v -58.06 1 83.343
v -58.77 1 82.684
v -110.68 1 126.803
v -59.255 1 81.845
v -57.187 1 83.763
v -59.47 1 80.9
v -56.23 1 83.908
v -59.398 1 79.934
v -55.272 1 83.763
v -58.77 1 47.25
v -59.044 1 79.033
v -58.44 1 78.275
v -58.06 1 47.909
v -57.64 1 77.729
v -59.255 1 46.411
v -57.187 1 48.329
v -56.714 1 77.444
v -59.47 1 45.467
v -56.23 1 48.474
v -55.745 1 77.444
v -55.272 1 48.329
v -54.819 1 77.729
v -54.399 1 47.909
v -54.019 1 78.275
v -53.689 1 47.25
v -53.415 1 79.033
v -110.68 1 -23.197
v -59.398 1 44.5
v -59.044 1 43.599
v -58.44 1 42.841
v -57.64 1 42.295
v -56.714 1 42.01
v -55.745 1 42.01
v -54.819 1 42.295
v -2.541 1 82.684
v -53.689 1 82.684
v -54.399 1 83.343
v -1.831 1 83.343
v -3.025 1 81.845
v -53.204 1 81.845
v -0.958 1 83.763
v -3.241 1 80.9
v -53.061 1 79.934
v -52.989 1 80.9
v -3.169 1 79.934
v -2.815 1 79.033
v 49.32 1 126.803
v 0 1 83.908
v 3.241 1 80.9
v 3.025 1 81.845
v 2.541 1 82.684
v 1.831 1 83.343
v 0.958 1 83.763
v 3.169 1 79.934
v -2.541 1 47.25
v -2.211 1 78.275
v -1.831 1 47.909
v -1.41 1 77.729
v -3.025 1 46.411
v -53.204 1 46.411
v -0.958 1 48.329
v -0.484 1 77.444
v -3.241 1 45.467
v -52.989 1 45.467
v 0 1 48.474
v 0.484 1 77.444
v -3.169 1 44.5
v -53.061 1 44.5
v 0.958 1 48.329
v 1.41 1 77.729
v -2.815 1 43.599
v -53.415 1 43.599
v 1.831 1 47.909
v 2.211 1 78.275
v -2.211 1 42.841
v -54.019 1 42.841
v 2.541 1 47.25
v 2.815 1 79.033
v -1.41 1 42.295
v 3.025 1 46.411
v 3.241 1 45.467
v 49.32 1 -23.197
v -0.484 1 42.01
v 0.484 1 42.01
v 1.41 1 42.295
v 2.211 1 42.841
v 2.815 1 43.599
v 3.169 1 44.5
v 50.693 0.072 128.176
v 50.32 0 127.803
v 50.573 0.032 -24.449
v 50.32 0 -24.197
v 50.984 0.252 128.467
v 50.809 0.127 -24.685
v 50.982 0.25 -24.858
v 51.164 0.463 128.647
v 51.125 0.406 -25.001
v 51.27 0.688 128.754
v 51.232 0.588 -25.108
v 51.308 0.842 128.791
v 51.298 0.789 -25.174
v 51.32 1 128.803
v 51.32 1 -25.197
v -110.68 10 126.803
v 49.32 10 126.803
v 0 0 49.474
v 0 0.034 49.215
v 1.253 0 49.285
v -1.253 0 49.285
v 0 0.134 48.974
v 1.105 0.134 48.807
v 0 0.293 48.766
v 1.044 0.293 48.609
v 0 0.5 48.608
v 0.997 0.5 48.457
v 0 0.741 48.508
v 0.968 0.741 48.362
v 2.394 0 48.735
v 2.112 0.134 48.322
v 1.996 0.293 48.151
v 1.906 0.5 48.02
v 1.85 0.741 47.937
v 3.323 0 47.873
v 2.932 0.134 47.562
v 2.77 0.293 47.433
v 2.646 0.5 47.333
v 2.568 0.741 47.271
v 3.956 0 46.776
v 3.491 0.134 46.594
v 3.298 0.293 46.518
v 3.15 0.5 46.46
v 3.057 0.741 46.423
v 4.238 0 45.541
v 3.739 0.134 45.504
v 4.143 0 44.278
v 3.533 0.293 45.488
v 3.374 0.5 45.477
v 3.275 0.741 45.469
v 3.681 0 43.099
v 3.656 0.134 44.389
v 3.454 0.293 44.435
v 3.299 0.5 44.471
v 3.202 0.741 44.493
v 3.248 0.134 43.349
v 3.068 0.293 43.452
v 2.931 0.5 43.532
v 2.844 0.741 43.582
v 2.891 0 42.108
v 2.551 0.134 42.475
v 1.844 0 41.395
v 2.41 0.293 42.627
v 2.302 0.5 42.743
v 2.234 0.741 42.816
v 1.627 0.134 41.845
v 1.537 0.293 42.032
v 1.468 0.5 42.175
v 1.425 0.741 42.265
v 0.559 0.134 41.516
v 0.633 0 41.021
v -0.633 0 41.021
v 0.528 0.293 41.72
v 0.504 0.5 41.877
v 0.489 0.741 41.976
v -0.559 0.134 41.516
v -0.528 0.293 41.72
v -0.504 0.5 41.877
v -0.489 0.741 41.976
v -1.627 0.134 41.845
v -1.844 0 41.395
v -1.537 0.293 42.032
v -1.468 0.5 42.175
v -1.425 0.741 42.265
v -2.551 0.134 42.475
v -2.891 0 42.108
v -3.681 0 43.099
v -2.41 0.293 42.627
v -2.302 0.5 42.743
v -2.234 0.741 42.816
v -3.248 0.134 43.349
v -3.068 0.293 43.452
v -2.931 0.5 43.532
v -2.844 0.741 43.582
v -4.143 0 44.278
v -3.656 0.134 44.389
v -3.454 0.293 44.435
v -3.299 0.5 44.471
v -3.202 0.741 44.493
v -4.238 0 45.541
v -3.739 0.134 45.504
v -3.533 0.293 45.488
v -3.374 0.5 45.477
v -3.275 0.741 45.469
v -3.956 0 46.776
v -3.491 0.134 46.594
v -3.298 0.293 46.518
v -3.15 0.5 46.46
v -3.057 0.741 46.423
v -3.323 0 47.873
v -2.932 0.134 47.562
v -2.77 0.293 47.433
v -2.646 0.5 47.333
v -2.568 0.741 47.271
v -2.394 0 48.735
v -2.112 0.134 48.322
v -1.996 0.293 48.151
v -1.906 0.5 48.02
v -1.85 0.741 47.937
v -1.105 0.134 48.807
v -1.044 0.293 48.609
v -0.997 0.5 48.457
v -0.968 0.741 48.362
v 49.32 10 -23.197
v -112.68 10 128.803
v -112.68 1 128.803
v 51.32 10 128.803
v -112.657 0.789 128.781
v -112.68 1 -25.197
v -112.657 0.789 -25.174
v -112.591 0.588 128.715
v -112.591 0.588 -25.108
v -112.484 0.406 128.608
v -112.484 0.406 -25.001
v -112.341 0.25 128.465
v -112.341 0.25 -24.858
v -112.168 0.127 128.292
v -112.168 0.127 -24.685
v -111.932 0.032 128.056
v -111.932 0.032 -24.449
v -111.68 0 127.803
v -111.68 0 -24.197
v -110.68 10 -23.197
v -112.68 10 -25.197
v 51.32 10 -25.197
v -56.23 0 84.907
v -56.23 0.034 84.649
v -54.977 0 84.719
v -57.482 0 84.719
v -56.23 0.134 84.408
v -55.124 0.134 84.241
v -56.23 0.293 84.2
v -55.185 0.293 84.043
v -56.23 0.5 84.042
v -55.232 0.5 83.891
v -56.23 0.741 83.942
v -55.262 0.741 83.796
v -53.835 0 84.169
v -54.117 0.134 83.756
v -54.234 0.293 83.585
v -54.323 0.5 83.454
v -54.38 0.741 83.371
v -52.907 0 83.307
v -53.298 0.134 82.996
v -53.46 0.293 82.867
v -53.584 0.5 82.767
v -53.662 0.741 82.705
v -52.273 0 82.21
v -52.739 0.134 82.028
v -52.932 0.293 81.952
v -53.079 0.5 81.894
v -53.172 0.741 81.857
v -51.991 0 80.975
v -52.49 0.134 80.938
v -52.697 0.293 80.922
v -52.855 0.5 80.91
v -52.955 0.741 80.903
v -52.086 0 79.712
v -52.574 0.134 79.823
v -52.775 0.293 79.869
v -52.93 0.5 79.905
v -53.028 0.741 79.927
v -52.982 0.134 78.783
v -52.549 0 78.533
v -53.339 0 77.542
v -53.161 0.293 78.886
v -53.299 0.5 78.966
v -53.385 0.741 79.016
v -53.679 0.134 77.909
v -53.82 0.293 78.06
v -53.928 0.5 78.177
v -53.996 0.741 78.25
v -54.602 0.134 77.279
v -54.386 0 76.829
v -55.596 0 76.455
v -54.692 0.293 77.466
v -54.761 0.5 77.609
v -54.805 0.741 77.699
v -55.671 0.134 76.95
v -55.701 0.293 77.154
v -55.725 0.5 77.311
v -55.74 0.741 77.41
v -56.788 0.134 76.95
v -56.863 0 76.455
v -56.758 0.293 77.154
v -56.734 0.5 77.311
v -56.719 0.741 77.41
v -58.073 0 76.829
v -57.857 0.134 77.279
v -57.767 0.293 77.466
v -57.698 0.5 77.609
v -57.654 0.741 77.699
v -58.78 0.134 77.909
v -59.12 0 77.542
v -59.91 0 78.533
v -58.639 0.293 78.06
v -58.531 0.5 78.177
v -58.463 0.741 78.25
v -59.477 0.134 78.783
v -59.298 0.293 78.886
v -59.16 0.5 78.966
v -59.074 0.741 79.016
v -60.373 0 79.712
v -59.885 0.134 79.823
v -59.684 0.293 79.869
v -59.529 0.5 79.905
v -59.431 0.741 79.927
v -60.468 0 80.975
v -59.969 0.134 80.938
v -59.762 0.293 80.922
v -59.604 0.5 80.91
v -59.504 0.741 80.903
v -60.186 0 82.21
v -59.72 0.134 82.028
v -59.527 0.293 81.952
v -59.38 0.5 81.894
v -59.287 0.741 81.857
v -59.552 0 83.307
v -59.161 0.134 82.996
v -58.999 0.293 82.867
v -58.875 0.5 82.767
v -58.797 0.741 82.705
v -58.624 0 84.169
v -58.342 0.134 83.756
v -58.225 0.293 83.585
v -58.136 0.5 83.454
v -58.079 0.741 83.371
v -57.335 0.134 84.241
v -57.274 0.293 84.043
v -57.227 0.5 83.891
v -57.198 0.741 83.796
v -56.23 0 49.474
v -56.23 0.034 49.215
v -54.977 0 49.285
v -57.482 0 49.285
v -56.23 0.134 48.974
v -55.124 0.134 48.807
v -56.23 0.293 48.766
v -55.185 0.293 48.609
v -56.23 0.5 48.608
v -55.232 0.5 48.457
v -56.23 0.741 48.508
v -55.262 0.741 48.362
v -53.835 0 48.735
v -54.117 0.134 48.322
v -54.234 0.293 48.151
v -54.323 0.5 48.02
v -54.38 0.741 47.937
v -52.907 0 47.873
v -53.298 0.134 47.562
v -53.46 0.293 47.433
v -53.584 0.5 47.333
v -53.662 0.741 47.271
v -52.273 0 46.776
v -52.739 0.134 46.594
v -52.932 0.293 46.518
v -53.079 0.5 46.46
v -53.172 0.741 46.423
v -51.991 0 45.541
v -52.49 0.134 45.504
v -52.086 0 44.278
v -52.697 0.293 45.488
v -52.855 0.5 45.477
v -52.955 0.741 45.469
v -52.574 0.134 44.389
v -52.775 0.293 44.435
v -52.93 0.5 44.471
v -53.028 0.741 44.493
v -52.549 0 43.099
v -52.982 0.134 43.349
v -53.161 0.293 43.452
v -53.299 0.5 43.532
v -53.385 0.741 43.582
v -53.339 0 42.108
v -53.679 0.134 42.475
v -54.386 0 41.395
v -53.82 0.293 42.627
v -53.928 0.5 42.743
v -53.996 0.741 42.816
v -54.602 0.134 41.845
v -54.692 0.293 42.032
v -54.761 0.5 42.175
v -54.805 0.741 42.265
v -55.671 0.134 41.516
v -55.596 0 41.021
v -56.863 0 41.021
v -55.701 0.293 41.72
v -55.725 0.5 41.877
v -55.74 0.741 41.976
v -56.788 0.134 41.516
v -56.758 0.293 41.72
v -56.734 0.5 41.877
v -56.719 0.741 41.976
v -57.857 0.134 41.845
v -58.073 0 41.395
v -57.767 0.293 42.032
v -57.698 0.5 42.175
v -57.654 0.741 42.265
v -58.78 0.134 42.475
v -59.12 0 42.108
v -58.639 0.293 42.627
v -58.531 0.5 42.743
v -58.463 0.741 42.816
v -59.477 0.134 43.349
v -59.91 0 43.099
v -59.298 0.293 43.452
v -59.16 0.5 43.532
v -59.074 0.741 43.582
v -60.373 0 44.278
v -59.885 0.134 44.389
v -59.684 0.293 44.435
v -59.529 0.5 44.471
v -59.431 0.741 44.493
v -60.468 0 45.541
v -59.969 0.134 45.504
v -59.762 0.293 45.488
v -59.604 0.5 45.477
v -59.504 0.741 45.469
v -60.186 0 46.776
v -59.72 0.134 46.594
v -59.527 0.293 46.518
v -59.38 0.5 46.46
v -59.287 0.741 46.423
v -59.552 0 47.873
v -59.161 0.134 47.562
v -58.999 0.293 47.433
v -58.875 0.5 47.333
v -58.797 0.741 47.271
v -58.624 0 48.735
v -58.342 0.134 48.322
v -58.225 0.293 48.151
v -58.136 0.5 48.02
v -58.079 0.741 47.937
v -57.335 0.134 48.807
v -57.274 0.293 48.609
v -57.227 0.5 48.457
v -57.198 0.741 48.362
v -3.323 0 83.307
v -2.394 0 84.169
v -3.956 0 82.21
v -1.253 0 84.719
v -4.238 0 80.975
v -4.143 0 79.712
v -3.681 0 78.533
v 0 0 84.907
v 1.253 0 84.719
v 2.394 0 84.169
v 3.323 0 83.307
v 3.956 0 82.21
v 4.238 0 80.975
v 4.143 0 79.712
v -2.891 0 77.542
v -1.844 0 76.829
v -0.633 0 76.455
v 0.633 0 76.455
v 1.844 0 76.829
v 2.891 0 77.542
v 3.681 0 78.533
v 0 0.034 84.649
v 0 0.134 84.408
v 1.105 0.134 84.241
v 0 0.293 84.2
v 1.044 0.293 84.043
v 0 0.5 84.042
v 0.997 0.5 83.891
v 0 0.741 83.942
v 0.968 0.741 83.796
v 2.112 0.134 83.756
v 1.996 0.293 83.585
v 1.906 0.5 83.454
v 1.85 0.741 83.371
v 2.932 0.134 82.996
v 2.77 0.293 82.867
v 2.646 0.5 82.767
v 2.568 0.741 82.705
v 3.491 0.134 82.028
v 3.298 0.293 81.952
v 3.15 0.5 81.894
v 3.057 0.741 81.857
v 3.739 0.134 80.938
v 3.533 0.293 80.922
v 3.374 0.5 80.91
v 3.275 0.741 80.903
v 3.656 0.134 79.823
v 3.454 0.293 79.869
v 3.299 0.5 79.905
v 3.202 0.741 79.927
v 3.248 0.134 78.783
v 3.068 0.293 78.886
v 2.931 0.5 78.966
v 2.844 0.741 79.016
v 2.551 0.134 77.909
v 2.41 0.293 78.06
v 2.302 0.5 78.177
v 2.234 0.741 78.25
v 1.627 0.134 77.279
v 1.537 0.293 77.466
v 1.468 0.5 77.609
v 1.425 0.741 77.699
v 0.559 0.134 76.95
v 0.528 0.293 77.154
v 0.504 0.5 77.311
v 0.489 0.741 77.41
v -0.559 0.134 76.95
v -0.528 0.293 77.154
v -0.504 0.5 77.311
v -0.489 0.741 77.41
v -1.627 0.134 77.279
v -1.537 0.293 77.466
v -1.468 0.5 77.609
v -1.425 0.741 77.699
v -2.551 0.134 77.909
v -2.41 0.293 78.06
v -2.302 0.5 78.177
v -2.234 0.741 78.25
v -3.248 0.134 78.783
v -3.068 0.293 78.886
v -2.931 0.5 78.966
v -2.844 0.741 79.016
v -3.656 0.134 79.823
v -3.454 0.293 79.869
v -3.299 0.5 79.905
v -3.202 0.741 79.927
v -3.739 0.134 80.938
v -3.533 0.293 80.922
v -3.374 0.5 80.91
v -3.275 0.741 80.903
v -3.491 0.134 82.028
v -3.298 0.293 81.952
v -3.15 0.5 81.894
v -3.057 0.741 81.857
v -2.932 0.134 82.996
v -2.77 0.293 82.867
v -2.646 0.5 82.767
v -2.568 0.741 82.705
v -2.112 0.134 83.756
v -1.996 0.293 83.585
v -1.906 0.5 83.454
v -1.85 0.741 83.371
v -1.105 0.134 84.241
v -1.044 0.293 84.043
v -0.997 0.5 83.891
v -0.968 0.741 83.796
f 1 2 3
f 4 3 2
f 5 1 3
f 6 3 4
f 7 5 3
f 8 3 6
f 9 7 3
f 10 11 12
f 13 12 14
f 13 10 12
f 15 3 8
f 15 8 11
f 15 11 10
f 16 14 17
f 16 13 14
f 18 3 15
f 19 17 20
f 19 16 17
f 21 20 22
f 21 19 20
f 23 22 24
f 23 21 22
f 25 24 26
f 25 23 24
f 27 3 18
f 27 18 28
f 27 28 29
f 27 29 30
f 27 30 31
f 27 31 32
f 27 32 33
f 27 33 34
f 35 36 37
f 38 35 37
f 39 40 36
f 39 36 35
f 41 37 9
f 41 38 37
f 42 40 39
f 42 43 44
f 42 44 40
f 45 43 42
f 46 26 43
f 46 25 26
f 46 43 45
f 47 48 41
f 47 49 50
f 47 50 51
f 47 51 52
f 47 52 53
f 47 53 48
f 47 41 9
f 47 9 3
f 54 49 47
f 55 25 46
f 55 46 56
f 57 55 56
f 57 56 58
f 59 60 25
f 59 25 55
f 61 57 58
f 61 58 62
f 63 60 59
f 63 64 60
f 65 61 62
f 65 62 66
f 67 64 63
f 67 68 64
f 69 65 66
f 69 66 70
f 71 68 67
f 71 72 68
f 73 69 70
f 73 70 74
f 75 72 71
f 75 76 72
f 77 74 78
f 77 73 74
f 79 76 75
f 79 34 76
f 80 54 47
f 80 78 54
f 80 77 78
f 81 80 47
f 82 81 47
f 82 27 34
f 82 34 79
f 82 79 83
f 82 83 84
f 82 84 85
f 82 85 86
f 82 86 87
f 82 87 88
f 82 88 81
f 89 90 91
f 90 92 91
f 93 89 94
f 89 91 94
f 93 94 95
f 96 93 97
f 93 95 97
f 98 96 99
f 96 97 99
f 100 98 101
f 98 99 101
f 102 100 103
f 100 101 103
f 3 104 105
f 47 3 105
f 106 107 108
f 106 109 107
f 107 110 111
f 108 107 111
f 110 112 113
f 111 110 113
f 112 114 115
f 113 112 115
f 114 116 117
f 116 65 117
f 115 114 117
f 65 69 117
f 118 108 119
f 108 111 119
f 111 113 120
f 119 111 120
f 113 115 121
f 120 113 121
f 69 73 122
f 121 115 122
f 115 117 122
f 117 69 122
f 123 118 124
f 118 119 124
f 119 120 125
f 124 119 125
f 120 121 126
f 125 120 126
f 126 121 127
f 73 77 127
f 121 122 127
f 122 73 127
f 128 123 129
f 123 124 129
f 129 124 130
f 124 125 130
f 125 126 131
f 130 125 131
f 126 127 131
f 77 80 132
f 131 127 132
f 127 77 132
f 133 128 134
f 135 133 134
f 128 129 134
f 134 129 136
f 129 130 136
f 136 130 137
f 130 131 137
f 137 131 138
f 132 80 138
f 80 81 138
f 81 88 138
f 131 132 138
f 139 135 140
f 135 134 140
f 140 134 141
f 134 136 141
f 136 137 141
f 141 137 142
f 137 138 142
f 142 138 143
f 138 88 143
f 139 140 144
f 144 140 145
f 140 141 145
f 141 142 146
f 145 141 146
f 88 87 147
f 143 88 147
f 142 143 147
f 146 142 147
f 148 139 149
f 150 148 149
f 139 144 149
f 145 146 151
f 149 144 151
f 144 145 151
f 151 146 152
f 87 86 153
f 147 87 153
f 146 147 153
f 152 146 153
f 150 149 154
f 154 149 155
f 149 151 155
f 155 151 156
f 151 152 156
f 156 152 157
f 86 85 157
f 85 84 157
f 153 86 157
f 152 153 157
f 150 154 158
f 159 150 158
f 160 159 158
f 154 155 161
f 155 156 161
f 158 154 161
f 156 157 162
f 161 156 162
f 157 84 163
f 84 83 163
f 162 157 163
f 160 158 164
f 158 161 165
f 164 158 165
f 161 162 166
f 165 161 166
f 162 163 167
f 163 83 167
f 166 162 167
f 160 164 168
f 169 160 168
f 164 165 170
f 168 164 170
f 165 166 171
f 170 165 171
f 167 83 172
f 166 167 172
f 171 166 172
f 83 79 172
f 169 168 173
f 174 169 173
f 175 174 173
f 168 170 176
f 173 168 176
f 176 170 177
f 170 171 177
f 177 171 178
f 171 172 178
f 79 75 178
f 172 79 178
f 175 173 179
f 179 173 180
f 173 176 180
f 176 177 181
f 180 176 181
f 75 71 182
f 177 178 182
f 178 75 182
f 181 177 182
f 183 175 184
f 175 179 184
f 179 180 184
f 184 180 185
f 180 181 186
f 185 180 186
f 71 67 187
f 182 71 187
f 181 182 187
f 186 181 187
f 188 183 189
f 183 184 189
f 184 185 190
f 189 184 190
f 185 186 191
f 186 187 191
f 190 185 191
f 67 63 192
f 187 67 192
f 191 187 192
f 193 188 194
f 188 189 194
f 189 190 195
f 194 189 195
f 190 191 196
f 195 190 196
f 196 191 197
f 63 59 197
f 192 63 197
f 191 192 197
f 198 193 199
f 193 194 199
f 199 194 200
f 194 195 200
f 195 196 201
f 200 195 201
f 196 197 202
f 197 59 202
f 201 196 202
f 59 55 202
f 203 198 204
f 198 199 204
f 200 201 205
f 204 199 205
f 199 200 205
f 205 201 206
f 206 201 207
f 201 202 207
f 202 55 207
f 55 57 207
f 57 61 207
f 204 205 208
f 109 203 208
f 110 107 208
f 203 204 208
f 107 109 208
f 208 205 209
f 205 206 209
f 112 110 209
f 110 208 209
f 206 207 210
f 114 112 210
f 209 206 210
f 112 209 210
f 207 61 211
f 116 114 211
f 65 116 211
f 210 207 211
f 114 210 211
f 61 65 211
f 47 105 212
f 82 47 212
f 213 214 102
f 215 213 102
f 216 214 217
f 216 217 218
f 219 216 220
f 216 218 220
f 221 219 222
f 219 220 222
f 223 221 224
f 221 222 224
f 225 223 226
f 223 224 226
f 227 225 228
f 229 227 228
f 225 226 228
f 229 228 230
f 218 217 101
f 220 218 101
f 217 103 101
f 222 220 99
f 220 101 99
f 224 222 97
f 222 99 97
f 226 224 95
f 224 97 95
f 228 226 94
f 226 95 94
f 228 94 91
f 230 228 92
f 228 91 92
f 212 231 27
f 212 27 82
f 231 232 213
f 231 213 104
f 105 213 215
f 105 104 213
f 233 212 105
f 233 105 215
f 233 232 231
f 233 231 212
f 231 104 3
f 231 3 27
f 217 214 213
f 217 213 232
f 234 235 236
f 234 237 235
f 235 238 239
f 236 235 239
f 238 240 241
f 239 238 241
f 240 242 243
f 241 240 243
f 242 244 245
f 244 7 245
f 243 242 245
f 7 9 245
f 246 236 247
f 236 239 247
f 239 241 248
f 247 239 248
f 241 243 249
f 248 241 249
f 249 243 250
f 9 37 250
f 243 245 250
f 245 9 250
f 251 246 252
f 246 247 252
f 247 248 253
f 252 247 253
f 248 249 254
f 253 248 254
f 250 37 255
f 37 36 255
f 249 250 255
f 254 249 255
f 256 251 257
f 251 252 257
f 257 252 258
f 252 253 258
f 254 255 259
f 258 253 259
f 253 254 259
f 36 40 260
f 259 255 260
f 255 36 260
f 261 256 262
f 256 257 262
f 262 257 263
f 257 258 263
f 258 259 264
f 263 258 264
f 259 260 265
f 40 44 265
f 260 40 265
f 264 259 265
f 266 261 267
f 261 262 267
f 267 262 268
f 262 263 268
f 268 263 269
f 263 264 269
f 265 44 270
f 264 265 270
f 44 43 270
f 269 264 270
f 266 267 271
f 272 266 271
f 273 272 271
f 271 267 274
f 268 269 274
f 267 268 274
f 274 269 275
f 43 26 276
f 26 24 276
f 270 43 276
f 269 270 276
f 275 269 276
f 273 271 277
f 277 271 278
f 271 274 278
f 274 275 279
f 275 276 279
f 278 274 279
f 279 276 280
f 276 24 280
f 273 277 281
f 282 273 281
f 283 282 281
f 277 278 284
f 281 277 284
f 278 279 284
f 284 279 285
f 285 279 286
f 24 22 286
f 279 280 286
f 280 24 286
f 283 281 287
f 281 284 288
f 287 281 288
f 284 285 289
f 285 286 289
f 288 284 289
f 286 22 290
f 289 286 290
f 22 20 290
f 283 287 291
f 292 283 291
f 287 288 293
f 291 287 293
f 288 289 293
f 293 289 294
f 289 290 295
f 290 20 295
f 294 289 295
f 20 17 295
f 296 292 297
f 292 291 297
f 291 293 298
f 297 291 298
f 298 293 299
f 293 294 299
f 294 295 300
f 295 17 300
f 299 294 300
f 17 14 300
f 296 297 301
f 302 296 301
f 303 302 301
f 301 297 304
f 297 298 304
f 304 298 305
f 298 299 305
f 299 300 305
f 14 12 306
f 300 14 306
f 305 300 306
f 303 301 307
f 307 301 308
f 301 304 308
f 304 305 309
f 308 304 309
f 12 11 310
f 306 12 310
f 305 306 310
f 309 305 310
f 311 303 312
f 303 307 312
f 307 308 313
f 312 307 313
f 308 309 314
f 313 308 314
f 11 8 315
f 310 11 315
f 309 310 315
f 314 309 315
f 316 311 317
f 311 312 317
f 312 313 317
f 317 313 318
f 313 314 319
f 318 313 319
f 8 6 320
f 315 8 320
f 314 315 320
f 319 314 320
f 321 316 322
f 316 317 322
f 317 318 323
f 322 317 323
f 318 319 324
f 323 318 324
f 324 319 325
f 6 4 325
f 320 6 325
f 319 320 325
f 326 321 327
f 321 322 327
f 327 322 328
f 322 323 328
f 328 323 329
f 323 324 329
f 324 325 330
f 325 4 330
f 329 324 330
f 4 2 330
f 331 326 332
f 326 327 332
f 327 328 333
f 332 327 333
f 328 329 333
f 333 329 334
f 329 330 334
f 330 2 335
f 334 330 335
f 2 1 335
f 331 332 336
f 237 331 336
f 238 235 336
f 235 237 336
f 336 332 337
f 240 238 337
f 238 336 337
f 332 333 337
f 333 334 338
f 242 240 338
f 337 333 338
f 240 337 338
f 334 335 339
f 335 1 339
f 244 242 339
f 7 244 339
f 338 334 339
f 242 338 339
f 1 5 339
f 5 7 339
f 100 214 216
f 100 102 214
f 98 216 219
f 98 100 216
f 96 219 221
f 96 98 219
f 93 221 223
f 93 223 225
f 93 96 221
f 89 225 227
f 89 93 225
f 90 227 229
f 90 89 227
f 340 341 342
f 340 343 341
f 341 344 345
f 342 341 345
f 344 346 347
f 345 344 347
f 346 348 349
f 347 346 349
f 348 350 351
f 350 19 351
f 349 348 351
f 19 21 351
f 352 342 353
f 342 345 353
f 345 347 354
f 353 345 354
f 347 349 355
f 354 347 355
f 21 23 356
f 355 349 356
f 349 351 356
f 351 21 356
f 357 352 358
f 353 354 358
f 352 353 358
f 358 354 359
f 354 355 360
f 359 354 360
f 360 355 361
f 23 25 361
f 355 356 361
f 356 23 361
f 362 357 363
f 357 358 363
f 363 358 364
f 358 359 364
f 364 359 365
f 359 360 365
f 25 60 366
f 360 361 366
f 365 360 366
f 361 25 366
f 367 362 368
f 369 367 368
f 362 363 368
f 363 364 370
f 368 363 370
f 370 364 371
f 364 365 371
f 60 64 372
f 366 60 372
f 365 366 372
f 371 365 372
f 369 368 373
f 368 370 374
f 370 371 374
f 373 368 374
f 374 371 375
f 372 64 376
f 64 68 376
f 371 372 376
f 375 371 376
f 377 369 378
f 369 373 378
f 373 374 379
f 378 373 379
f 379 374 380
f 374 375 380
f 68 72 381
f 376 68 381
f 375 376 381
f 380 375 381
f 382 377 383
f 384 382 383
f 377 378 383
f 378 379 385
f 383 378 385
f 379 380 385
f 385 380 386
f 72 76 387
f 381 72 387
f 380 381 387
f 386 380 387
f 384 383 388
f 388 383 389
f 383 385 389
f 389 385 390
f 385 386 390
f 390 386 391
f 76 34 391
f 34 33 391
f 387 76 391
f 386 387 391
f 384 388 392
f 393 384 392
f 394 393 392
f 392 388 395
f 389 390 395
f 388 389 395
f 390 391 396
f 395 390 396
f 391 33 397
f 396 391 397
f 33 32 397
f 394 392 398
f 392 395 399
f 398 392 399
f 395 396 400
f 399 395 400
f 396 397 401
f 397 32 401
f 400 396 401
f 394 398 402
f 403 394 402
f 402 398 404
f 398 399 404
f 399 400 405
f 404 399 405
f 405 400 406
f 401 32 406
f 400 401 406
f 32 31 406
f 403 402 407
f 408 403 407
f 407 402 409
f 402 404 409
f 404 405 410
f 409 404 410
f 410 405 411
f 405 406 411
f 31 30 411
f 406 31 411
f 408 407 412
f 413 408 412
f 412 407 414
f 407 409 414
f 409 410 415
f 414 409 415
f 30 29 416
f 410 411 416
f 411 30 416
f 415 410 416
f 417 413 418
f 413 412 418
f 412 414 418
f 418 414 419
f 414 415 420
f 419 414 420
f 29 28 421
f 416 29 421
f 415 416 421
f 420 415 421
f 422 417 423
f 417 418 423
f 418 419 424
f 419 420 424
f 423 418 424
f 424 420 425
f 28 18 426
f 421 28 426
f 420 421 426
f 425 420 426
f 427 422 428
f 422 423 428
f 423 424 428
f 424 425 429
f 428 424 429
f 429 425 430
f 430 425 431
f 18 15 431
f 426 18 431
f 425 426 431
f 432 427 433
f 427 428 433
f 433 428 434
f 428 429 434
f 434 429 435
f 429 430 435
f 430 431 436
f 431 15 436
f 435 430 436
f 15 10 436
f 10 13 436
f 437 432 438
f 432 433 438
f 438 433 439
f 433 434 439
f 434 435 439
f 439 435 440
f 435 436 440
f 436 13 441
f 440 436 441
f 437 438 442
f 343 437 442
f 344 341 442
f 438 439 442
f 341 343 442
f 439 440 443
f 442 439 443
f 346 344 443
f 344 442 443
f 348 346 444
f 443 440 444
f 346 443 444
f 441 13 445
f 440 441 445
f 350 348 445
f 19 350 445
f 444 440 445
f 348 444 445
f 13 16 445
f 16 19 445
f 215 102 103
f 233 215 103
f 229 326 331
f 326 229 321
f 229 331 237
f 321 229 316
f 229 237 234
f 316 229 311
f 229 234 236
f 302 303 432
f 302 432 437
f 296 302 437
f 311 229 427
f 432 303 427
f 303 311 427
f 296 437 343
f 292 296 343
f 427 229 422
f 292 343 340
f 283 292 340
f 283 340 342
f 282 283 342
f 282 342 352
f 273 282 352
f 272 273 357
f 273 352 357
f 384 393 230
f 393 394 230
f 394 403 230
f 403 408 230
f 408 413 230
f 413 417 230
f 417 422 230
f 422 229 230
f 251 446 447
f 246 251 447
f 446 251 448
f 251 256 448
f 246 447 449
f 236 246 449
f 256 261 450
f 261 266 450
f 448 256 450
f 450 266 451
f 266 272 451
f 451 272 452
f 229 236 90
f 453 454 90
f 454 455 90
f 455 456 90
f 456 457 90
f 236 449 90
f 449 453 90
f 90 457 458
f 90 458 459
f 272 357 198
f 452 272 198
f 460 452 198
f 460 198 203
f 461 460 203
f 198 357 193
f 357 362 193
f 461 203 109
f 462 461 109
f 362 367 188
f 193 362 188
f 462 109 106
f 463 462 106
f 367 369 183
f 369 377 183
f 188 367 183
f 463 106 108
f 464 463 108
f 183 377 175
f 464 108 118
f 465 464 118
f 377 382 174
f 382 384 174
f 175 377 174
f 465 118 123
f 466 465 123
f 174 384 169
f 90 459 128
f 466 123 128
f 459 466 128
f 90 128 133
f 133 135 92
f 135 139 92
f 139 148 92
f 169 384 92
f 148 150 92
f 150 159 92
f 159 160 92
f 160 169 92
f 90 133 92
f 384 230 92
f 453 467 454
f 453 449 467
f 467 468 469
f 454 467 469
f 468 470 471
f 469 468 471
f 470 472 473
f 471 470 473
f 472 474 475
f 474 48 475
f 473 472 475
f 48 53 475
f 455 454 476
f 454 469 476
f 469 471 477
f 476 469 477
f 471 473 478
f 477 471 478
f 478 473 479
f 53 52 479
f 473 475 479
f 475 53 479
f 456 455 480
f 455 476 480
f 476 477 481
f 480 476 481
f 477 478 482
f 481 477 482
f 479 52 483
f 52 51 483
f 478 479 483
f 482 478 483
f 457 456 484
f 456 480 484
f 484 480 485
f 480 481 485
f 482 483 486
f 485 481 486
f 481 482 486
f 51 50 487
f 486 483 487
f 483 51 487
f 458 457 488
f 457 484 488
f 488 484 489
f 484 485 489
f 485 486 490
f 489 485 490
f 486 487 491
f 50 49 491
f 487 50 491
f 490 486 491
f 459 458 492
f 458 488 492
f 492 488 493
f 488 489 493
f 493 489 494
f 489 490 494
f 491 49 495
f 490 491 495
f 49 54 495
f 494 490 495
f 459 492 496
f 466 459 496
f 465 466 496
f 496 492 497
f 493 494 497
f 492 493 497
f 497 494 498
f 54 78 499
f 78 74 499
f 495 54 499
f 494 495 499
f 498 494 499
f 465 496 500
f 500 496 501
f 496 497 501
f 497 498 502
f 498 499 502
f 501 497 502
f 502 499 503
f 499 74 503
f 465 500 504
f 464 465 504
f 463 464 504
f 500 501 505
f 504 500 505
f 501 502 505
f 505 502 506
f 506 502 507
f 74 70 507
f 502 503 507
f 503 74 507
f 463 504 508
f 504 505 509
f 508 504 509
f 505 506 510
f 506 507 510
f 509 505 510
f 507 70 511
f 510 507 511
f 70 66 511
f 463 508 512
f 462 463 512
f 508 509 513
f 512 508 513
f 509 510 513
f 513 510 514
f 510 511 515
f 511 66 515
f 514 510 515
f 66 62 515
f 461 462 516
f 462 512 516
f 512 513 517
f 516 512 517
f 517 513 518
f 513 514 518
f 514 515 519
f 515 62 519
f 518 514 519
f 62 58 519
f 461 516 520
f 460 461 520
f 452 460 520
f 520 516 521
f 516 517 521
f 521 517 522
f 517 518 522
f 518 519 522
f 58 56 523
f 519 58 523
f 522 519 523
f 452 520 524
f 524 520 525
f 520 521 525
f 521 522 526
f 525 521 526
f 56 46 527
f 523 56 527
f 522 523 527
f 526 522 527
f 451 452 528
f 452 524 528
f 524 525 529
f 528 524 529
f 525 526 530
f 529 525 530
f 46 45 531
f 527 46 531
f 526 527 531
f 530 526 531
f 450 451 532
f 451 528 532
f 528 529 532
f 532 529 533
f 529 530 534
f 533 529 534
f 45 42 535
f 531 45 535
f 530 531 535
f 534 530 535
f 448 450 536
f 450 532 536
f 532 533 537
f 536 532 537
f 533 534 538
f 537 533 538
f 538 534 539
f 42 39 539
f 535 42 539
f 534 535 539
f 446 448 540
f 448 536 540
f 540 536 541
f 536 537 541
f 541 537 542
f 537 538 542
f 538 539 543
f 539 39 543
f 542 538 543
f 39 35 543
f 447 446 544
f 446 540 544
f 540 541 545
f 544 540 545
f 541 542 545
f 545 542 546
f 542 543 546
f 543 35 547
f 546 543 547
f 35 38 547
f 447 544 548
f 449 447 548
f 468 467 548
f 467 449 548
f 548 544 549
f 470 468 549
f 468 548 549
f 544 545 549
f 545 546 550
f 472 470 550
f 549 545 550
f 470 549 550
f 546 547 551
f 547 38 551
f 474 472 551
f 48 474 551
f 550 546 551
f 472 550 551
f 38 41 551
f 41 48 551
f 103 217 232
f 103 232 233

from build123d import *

# Parameters (mm, degrees)
SKETCH1_W           = 164
SKETCH1_H           = 154
SKETCH1_R           = 3.25
BOSS_EXTRUDE1_DEPTH = 10
SKETCH2_W           = 160
SKETCH2_H           = 150
CUT_EXTRUDE1_DEPTH  = 9
FILLET2_R           = 1


with BuildPart() as part:
    # Sketch1 → Boss-Extrude1 (new body)
    with BuildSketch(Plane(origin=(0, 0, 0), x_dir=(1, 0, 0), z_dir=(0, 1, 0))):
        with Locations((-30.679775281, -51.803370787)):
            Rectangle(SKETCH1_W, SKETCH1_H)
        with Locations(Location((-56.229503417, -45.223629633, 0), (0, 0, 270))):
            Circle(SKETCH1_R, mode=Mode.SUBTRACT)
        with Locations(Location((0, -45.223629633, 0), (0, 0, 270))):
            Circle(SKETCH1_R, mode=Mode.SUBTRACT)
        with Locations(Location((-56.229503417, -80.657592441, 0), (0, 0, 270))):
            Circle(SKETCH1_R, mode=Mode.SUBTRACT)
        with Locations(Location((0, -80.657592441, 0), (0, 0, 270))):
            Circle(SKETCH1_R, mode=Mode.SUBTRACT)
    extrude(amount=BOSS_EXTRUDE1_DEPTH)

    # Sketch2 → Cut-Extrude1 (cut)
    with BuildSketch(Plane(origin=(0, 10, 0), x_dir=(1, 0, 0), z_dir=(0, 1, 0))):
        with Locations((-30.679775281, -51.803370787)):
            Rectangle(SKETCH2_W, SKETCH2_H)
    extrude(amount=-CUT_EXTRUDE1_DEPTH, mode=Mode.SUBTRACT)

    # Fillet2
    fillet2_edges = [part.edges().sort_by_distance(p)[0] for p in [
        (-56.229503417, 0, 41.973629633),
        (0, 0, 41.973629633),
        (-56.229503417, 0, 77.407592441),
        (0, 0, 77.407592441),
        (-30.679775281, 0, -25.196629213),
        (51.320224719, 0, 51.803370787),
        (-30.679775281, 0, 128.803370787),
        (-112.679775281, 0, 51.803370787),
    ]]
    fillet(fillet2_edges, radius=FILLET2_R - 0.0001)  # a hair under: the kernel refuses the full size


solid = part.part
